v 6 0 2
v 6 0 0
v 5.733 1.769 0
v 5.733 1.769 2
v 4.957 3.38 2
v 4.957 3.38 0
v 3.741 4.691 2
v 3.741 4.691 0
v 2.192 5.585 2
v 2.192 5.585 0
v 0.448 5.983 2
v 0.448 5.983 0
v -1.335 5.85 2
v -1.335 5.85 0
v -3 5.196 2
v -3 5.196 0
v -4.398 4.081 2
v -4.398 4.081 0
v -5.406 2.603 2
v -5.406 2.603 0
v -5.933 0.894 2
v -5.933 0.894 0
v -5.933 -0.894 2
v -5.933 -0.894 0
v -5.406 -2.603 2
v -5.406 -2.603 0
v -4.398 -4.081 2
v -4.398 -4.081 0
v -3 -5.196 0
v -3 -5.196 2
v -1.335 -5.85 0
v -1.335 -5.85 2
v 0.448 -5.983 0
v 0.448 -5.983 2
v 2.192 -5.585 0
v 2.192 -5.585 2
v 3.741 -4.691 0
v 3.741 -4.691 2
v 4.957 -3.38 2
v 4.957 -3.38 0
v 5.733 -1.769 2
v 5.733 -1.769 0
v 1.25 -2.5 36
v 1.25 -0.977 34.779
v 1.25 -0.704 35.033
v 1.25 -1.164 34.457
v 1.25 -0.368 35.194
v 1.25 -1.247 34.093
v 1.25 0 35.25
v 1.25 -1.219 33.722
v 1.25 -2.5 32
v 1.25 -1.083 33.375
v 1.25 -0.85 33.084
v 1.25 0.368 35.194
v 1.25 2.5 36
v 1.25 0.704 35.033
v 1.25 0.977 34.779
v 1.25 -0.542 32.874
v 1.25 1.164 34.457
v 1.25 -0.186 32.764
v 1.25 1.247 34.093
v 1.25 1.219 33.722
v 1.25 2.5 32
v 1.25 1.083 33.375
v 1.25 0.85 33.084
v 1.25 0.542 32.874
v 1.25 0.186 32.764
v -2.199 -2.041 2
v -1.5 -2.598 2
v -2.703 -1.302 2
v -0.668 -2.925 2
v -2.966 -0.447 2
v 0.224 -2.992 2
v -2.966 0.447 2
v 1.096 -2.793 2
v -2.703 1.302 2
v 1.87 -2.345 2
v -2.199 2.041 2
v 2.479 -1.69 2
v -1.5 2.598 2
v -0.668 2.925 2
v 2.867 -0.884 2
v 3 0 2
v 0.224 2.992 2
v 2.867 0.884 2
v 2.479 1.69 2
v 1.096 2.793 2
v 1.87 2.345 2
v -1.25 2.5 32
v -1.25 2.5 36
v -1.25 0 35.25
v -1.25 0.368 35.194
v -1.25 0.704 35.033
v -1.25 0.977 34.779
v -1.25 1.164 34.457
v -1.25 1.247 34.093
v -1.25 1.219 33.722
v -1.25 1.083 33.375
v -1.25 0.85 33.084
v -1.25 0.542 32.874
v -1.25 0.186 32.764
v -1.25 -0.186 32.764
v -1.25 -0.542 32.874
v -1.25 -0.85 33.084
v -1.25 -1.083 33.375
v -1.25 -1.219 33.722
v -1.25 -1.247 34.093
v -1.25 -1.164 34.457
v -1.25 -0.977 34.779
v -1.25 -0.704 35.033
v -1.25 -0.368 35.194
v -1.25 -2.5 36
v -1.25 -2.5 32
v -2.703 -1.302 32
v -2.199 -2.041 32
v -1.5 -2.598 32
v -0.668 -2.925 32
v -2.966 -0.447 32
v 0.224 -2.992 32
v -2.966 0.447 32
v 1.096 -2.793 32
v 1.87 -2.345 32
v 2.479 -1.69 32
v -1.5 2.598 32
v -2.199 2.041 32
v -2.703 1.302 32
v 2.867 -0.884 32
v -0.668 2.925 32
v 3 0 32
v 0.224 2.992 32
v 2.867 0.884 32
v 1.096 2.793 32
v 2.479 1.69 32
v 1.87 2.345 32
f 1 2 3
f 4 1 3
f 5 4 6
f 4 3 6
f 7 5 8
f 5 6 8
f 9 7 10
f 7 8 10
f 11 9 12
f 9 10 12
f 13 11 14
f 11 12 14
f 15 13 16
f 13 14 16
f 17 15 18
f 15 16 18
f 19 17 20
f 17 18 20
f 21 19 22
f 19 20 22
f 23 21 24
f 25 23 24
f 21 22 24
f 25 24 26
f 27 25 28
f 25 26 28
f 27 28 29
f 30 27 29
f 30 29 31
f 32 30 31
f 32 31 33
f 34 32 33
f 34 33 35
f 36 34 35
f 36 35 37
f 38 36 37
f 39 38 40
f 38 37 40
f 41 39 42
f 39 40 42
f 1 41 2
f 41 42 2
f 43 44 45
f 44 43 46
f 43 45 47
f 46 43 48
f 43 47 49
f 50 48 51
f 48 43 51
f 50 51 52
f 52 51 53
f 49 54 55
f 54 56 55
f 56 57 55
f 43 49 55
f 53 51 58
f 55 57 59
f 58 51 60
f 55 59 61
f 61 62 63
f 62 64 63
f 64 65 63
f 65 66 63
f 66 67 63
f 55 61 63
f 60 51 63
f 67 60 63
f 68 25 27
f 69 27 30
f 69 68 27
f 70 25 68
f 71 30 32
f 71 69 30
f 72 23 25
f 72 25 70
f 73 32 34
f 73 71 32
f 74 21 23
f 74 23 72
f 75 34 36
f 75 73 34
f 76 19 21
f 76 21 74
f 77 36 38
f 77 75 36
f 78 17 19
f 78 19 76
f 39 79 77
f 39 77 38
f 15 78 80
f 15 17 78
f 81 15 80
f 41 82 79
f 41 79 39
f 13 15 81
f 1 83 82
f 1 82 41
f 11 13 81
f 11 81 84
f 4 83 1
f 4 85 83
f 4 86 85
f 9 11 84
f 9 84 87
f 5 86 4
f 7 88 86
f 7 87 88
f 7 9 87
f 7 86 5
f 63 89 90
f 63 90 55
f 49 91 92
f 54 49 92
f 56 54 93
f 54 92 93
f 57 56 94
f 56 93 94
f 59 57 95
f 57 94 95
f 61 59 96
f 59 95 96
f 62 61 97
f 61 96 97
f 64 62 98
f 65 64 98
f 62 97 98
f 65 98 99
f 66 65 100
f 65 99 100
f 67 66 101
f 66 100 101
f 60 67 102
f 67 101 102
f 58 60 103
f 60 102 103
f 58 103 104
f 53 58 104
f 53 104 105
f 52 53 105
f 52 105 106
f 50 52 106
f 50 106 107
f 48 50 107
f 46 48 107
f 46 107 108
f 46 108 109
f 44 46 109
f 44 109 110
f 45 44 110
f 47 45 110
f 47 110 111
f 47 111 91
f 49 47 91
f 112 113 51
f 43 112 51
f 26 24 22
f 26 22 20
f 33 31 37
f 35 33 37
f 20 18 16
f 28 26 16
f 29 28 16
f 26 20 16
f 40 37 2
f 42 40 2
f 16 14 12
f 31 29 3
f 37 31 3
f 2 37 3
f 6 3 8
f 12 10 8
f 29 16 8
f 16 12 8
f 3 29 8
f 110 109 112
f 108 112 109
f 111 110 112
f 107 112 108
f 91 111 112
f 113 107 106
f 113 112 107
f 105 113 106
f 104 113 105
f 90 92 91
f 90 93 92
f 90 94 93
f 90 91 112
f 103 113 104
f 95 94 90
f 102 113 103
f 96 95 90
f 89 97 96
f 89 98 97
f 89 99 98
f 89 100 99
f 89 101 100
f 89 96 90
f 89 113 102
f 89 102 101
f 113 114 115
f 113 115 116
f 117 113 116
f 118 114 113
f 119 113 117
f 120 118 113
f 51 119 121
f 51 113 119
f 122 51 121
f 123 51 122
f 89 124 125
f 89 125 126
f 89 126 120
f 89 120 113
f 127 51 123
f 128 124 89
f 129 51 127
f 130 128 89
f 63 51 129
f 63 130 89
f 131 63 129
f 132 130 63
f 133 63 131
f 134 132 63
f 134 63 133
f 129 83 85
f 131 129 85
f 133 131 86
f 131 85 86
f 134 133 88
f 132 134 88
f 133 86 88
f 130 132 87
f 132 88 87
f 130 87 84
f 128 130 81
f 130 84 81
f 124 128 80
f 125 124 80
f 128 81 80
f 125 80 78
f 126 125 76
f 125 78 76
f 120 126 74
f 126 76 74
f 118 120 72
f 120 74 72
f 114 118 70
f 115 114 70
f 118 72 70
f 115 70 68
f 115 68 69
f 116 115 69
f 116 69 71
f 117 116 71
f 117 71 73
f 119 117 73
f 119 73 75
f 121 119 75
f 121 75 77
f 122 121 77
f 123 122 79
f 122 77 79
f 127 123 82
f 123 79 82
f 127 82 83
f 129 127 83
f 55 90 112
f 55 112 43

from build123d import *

# Parameters (mm, degrees)
SKETCH1_R           = 6
BOSS_EXTRUDE1_DEPTH = 2
SKETCH2_R           = 3
BOSS_EXTRUDE2_DEPTH = 30
SKETCH3_W           = 2.5
SKETCH3_H           = 5
BOSS_EXTRUDE3_DEPTH = 4
CUT_EXTRUDE1_REACH  = 39.21
SKETCH4_R           = 1.25


with BuildPart() as part:
    # Sketch1 → Boss-Extrude1 (new body)
    with BuildSketch(Plane.XY):
        Circle(SKETCH1_R)
    extrude(amount=BOSS_EXTRUDE1_DEPTH)

    # Sketch2 → Boss-Extrude2 (add)
    with BuildSketch(Plane.XY.offset(2)):
        Circle(SKETCH2_R)
    extrude(amount=BOSS_EXTRUDE2_DEPTH)

    # Sketch3 → Boss-Extrude3 (add)
    with BuildSketch(Plane.XY.offset(32)):
        Rectangle(SKETCH3_W, SKETCH3_H)
    extrude(amount=BOSS_EXTRUDE3_DEPTH)

    # Sketch4 → Cut-Extrude1 (cut, up to next)
    with BuildSketch(Plane.ZY.offset(1.25), mode=Mode.PRIVATE) as cut_extrude1_sk1:
        with Locations((34, 0)):
            Circle(SKETCH4_R)
    cut_extrude1_tool1 = extrude(cut_extrude1_sk1.sketch, amount=-CUT_EXTRUDE1_REACH, mode=Mode.PRIVATE) & part.part
    add(cut_extrude1_tool1.solids().sort_by_distance((-1.25, 0, 34))[0], mode=Mode.SUBTRACT)


solid = part.part
